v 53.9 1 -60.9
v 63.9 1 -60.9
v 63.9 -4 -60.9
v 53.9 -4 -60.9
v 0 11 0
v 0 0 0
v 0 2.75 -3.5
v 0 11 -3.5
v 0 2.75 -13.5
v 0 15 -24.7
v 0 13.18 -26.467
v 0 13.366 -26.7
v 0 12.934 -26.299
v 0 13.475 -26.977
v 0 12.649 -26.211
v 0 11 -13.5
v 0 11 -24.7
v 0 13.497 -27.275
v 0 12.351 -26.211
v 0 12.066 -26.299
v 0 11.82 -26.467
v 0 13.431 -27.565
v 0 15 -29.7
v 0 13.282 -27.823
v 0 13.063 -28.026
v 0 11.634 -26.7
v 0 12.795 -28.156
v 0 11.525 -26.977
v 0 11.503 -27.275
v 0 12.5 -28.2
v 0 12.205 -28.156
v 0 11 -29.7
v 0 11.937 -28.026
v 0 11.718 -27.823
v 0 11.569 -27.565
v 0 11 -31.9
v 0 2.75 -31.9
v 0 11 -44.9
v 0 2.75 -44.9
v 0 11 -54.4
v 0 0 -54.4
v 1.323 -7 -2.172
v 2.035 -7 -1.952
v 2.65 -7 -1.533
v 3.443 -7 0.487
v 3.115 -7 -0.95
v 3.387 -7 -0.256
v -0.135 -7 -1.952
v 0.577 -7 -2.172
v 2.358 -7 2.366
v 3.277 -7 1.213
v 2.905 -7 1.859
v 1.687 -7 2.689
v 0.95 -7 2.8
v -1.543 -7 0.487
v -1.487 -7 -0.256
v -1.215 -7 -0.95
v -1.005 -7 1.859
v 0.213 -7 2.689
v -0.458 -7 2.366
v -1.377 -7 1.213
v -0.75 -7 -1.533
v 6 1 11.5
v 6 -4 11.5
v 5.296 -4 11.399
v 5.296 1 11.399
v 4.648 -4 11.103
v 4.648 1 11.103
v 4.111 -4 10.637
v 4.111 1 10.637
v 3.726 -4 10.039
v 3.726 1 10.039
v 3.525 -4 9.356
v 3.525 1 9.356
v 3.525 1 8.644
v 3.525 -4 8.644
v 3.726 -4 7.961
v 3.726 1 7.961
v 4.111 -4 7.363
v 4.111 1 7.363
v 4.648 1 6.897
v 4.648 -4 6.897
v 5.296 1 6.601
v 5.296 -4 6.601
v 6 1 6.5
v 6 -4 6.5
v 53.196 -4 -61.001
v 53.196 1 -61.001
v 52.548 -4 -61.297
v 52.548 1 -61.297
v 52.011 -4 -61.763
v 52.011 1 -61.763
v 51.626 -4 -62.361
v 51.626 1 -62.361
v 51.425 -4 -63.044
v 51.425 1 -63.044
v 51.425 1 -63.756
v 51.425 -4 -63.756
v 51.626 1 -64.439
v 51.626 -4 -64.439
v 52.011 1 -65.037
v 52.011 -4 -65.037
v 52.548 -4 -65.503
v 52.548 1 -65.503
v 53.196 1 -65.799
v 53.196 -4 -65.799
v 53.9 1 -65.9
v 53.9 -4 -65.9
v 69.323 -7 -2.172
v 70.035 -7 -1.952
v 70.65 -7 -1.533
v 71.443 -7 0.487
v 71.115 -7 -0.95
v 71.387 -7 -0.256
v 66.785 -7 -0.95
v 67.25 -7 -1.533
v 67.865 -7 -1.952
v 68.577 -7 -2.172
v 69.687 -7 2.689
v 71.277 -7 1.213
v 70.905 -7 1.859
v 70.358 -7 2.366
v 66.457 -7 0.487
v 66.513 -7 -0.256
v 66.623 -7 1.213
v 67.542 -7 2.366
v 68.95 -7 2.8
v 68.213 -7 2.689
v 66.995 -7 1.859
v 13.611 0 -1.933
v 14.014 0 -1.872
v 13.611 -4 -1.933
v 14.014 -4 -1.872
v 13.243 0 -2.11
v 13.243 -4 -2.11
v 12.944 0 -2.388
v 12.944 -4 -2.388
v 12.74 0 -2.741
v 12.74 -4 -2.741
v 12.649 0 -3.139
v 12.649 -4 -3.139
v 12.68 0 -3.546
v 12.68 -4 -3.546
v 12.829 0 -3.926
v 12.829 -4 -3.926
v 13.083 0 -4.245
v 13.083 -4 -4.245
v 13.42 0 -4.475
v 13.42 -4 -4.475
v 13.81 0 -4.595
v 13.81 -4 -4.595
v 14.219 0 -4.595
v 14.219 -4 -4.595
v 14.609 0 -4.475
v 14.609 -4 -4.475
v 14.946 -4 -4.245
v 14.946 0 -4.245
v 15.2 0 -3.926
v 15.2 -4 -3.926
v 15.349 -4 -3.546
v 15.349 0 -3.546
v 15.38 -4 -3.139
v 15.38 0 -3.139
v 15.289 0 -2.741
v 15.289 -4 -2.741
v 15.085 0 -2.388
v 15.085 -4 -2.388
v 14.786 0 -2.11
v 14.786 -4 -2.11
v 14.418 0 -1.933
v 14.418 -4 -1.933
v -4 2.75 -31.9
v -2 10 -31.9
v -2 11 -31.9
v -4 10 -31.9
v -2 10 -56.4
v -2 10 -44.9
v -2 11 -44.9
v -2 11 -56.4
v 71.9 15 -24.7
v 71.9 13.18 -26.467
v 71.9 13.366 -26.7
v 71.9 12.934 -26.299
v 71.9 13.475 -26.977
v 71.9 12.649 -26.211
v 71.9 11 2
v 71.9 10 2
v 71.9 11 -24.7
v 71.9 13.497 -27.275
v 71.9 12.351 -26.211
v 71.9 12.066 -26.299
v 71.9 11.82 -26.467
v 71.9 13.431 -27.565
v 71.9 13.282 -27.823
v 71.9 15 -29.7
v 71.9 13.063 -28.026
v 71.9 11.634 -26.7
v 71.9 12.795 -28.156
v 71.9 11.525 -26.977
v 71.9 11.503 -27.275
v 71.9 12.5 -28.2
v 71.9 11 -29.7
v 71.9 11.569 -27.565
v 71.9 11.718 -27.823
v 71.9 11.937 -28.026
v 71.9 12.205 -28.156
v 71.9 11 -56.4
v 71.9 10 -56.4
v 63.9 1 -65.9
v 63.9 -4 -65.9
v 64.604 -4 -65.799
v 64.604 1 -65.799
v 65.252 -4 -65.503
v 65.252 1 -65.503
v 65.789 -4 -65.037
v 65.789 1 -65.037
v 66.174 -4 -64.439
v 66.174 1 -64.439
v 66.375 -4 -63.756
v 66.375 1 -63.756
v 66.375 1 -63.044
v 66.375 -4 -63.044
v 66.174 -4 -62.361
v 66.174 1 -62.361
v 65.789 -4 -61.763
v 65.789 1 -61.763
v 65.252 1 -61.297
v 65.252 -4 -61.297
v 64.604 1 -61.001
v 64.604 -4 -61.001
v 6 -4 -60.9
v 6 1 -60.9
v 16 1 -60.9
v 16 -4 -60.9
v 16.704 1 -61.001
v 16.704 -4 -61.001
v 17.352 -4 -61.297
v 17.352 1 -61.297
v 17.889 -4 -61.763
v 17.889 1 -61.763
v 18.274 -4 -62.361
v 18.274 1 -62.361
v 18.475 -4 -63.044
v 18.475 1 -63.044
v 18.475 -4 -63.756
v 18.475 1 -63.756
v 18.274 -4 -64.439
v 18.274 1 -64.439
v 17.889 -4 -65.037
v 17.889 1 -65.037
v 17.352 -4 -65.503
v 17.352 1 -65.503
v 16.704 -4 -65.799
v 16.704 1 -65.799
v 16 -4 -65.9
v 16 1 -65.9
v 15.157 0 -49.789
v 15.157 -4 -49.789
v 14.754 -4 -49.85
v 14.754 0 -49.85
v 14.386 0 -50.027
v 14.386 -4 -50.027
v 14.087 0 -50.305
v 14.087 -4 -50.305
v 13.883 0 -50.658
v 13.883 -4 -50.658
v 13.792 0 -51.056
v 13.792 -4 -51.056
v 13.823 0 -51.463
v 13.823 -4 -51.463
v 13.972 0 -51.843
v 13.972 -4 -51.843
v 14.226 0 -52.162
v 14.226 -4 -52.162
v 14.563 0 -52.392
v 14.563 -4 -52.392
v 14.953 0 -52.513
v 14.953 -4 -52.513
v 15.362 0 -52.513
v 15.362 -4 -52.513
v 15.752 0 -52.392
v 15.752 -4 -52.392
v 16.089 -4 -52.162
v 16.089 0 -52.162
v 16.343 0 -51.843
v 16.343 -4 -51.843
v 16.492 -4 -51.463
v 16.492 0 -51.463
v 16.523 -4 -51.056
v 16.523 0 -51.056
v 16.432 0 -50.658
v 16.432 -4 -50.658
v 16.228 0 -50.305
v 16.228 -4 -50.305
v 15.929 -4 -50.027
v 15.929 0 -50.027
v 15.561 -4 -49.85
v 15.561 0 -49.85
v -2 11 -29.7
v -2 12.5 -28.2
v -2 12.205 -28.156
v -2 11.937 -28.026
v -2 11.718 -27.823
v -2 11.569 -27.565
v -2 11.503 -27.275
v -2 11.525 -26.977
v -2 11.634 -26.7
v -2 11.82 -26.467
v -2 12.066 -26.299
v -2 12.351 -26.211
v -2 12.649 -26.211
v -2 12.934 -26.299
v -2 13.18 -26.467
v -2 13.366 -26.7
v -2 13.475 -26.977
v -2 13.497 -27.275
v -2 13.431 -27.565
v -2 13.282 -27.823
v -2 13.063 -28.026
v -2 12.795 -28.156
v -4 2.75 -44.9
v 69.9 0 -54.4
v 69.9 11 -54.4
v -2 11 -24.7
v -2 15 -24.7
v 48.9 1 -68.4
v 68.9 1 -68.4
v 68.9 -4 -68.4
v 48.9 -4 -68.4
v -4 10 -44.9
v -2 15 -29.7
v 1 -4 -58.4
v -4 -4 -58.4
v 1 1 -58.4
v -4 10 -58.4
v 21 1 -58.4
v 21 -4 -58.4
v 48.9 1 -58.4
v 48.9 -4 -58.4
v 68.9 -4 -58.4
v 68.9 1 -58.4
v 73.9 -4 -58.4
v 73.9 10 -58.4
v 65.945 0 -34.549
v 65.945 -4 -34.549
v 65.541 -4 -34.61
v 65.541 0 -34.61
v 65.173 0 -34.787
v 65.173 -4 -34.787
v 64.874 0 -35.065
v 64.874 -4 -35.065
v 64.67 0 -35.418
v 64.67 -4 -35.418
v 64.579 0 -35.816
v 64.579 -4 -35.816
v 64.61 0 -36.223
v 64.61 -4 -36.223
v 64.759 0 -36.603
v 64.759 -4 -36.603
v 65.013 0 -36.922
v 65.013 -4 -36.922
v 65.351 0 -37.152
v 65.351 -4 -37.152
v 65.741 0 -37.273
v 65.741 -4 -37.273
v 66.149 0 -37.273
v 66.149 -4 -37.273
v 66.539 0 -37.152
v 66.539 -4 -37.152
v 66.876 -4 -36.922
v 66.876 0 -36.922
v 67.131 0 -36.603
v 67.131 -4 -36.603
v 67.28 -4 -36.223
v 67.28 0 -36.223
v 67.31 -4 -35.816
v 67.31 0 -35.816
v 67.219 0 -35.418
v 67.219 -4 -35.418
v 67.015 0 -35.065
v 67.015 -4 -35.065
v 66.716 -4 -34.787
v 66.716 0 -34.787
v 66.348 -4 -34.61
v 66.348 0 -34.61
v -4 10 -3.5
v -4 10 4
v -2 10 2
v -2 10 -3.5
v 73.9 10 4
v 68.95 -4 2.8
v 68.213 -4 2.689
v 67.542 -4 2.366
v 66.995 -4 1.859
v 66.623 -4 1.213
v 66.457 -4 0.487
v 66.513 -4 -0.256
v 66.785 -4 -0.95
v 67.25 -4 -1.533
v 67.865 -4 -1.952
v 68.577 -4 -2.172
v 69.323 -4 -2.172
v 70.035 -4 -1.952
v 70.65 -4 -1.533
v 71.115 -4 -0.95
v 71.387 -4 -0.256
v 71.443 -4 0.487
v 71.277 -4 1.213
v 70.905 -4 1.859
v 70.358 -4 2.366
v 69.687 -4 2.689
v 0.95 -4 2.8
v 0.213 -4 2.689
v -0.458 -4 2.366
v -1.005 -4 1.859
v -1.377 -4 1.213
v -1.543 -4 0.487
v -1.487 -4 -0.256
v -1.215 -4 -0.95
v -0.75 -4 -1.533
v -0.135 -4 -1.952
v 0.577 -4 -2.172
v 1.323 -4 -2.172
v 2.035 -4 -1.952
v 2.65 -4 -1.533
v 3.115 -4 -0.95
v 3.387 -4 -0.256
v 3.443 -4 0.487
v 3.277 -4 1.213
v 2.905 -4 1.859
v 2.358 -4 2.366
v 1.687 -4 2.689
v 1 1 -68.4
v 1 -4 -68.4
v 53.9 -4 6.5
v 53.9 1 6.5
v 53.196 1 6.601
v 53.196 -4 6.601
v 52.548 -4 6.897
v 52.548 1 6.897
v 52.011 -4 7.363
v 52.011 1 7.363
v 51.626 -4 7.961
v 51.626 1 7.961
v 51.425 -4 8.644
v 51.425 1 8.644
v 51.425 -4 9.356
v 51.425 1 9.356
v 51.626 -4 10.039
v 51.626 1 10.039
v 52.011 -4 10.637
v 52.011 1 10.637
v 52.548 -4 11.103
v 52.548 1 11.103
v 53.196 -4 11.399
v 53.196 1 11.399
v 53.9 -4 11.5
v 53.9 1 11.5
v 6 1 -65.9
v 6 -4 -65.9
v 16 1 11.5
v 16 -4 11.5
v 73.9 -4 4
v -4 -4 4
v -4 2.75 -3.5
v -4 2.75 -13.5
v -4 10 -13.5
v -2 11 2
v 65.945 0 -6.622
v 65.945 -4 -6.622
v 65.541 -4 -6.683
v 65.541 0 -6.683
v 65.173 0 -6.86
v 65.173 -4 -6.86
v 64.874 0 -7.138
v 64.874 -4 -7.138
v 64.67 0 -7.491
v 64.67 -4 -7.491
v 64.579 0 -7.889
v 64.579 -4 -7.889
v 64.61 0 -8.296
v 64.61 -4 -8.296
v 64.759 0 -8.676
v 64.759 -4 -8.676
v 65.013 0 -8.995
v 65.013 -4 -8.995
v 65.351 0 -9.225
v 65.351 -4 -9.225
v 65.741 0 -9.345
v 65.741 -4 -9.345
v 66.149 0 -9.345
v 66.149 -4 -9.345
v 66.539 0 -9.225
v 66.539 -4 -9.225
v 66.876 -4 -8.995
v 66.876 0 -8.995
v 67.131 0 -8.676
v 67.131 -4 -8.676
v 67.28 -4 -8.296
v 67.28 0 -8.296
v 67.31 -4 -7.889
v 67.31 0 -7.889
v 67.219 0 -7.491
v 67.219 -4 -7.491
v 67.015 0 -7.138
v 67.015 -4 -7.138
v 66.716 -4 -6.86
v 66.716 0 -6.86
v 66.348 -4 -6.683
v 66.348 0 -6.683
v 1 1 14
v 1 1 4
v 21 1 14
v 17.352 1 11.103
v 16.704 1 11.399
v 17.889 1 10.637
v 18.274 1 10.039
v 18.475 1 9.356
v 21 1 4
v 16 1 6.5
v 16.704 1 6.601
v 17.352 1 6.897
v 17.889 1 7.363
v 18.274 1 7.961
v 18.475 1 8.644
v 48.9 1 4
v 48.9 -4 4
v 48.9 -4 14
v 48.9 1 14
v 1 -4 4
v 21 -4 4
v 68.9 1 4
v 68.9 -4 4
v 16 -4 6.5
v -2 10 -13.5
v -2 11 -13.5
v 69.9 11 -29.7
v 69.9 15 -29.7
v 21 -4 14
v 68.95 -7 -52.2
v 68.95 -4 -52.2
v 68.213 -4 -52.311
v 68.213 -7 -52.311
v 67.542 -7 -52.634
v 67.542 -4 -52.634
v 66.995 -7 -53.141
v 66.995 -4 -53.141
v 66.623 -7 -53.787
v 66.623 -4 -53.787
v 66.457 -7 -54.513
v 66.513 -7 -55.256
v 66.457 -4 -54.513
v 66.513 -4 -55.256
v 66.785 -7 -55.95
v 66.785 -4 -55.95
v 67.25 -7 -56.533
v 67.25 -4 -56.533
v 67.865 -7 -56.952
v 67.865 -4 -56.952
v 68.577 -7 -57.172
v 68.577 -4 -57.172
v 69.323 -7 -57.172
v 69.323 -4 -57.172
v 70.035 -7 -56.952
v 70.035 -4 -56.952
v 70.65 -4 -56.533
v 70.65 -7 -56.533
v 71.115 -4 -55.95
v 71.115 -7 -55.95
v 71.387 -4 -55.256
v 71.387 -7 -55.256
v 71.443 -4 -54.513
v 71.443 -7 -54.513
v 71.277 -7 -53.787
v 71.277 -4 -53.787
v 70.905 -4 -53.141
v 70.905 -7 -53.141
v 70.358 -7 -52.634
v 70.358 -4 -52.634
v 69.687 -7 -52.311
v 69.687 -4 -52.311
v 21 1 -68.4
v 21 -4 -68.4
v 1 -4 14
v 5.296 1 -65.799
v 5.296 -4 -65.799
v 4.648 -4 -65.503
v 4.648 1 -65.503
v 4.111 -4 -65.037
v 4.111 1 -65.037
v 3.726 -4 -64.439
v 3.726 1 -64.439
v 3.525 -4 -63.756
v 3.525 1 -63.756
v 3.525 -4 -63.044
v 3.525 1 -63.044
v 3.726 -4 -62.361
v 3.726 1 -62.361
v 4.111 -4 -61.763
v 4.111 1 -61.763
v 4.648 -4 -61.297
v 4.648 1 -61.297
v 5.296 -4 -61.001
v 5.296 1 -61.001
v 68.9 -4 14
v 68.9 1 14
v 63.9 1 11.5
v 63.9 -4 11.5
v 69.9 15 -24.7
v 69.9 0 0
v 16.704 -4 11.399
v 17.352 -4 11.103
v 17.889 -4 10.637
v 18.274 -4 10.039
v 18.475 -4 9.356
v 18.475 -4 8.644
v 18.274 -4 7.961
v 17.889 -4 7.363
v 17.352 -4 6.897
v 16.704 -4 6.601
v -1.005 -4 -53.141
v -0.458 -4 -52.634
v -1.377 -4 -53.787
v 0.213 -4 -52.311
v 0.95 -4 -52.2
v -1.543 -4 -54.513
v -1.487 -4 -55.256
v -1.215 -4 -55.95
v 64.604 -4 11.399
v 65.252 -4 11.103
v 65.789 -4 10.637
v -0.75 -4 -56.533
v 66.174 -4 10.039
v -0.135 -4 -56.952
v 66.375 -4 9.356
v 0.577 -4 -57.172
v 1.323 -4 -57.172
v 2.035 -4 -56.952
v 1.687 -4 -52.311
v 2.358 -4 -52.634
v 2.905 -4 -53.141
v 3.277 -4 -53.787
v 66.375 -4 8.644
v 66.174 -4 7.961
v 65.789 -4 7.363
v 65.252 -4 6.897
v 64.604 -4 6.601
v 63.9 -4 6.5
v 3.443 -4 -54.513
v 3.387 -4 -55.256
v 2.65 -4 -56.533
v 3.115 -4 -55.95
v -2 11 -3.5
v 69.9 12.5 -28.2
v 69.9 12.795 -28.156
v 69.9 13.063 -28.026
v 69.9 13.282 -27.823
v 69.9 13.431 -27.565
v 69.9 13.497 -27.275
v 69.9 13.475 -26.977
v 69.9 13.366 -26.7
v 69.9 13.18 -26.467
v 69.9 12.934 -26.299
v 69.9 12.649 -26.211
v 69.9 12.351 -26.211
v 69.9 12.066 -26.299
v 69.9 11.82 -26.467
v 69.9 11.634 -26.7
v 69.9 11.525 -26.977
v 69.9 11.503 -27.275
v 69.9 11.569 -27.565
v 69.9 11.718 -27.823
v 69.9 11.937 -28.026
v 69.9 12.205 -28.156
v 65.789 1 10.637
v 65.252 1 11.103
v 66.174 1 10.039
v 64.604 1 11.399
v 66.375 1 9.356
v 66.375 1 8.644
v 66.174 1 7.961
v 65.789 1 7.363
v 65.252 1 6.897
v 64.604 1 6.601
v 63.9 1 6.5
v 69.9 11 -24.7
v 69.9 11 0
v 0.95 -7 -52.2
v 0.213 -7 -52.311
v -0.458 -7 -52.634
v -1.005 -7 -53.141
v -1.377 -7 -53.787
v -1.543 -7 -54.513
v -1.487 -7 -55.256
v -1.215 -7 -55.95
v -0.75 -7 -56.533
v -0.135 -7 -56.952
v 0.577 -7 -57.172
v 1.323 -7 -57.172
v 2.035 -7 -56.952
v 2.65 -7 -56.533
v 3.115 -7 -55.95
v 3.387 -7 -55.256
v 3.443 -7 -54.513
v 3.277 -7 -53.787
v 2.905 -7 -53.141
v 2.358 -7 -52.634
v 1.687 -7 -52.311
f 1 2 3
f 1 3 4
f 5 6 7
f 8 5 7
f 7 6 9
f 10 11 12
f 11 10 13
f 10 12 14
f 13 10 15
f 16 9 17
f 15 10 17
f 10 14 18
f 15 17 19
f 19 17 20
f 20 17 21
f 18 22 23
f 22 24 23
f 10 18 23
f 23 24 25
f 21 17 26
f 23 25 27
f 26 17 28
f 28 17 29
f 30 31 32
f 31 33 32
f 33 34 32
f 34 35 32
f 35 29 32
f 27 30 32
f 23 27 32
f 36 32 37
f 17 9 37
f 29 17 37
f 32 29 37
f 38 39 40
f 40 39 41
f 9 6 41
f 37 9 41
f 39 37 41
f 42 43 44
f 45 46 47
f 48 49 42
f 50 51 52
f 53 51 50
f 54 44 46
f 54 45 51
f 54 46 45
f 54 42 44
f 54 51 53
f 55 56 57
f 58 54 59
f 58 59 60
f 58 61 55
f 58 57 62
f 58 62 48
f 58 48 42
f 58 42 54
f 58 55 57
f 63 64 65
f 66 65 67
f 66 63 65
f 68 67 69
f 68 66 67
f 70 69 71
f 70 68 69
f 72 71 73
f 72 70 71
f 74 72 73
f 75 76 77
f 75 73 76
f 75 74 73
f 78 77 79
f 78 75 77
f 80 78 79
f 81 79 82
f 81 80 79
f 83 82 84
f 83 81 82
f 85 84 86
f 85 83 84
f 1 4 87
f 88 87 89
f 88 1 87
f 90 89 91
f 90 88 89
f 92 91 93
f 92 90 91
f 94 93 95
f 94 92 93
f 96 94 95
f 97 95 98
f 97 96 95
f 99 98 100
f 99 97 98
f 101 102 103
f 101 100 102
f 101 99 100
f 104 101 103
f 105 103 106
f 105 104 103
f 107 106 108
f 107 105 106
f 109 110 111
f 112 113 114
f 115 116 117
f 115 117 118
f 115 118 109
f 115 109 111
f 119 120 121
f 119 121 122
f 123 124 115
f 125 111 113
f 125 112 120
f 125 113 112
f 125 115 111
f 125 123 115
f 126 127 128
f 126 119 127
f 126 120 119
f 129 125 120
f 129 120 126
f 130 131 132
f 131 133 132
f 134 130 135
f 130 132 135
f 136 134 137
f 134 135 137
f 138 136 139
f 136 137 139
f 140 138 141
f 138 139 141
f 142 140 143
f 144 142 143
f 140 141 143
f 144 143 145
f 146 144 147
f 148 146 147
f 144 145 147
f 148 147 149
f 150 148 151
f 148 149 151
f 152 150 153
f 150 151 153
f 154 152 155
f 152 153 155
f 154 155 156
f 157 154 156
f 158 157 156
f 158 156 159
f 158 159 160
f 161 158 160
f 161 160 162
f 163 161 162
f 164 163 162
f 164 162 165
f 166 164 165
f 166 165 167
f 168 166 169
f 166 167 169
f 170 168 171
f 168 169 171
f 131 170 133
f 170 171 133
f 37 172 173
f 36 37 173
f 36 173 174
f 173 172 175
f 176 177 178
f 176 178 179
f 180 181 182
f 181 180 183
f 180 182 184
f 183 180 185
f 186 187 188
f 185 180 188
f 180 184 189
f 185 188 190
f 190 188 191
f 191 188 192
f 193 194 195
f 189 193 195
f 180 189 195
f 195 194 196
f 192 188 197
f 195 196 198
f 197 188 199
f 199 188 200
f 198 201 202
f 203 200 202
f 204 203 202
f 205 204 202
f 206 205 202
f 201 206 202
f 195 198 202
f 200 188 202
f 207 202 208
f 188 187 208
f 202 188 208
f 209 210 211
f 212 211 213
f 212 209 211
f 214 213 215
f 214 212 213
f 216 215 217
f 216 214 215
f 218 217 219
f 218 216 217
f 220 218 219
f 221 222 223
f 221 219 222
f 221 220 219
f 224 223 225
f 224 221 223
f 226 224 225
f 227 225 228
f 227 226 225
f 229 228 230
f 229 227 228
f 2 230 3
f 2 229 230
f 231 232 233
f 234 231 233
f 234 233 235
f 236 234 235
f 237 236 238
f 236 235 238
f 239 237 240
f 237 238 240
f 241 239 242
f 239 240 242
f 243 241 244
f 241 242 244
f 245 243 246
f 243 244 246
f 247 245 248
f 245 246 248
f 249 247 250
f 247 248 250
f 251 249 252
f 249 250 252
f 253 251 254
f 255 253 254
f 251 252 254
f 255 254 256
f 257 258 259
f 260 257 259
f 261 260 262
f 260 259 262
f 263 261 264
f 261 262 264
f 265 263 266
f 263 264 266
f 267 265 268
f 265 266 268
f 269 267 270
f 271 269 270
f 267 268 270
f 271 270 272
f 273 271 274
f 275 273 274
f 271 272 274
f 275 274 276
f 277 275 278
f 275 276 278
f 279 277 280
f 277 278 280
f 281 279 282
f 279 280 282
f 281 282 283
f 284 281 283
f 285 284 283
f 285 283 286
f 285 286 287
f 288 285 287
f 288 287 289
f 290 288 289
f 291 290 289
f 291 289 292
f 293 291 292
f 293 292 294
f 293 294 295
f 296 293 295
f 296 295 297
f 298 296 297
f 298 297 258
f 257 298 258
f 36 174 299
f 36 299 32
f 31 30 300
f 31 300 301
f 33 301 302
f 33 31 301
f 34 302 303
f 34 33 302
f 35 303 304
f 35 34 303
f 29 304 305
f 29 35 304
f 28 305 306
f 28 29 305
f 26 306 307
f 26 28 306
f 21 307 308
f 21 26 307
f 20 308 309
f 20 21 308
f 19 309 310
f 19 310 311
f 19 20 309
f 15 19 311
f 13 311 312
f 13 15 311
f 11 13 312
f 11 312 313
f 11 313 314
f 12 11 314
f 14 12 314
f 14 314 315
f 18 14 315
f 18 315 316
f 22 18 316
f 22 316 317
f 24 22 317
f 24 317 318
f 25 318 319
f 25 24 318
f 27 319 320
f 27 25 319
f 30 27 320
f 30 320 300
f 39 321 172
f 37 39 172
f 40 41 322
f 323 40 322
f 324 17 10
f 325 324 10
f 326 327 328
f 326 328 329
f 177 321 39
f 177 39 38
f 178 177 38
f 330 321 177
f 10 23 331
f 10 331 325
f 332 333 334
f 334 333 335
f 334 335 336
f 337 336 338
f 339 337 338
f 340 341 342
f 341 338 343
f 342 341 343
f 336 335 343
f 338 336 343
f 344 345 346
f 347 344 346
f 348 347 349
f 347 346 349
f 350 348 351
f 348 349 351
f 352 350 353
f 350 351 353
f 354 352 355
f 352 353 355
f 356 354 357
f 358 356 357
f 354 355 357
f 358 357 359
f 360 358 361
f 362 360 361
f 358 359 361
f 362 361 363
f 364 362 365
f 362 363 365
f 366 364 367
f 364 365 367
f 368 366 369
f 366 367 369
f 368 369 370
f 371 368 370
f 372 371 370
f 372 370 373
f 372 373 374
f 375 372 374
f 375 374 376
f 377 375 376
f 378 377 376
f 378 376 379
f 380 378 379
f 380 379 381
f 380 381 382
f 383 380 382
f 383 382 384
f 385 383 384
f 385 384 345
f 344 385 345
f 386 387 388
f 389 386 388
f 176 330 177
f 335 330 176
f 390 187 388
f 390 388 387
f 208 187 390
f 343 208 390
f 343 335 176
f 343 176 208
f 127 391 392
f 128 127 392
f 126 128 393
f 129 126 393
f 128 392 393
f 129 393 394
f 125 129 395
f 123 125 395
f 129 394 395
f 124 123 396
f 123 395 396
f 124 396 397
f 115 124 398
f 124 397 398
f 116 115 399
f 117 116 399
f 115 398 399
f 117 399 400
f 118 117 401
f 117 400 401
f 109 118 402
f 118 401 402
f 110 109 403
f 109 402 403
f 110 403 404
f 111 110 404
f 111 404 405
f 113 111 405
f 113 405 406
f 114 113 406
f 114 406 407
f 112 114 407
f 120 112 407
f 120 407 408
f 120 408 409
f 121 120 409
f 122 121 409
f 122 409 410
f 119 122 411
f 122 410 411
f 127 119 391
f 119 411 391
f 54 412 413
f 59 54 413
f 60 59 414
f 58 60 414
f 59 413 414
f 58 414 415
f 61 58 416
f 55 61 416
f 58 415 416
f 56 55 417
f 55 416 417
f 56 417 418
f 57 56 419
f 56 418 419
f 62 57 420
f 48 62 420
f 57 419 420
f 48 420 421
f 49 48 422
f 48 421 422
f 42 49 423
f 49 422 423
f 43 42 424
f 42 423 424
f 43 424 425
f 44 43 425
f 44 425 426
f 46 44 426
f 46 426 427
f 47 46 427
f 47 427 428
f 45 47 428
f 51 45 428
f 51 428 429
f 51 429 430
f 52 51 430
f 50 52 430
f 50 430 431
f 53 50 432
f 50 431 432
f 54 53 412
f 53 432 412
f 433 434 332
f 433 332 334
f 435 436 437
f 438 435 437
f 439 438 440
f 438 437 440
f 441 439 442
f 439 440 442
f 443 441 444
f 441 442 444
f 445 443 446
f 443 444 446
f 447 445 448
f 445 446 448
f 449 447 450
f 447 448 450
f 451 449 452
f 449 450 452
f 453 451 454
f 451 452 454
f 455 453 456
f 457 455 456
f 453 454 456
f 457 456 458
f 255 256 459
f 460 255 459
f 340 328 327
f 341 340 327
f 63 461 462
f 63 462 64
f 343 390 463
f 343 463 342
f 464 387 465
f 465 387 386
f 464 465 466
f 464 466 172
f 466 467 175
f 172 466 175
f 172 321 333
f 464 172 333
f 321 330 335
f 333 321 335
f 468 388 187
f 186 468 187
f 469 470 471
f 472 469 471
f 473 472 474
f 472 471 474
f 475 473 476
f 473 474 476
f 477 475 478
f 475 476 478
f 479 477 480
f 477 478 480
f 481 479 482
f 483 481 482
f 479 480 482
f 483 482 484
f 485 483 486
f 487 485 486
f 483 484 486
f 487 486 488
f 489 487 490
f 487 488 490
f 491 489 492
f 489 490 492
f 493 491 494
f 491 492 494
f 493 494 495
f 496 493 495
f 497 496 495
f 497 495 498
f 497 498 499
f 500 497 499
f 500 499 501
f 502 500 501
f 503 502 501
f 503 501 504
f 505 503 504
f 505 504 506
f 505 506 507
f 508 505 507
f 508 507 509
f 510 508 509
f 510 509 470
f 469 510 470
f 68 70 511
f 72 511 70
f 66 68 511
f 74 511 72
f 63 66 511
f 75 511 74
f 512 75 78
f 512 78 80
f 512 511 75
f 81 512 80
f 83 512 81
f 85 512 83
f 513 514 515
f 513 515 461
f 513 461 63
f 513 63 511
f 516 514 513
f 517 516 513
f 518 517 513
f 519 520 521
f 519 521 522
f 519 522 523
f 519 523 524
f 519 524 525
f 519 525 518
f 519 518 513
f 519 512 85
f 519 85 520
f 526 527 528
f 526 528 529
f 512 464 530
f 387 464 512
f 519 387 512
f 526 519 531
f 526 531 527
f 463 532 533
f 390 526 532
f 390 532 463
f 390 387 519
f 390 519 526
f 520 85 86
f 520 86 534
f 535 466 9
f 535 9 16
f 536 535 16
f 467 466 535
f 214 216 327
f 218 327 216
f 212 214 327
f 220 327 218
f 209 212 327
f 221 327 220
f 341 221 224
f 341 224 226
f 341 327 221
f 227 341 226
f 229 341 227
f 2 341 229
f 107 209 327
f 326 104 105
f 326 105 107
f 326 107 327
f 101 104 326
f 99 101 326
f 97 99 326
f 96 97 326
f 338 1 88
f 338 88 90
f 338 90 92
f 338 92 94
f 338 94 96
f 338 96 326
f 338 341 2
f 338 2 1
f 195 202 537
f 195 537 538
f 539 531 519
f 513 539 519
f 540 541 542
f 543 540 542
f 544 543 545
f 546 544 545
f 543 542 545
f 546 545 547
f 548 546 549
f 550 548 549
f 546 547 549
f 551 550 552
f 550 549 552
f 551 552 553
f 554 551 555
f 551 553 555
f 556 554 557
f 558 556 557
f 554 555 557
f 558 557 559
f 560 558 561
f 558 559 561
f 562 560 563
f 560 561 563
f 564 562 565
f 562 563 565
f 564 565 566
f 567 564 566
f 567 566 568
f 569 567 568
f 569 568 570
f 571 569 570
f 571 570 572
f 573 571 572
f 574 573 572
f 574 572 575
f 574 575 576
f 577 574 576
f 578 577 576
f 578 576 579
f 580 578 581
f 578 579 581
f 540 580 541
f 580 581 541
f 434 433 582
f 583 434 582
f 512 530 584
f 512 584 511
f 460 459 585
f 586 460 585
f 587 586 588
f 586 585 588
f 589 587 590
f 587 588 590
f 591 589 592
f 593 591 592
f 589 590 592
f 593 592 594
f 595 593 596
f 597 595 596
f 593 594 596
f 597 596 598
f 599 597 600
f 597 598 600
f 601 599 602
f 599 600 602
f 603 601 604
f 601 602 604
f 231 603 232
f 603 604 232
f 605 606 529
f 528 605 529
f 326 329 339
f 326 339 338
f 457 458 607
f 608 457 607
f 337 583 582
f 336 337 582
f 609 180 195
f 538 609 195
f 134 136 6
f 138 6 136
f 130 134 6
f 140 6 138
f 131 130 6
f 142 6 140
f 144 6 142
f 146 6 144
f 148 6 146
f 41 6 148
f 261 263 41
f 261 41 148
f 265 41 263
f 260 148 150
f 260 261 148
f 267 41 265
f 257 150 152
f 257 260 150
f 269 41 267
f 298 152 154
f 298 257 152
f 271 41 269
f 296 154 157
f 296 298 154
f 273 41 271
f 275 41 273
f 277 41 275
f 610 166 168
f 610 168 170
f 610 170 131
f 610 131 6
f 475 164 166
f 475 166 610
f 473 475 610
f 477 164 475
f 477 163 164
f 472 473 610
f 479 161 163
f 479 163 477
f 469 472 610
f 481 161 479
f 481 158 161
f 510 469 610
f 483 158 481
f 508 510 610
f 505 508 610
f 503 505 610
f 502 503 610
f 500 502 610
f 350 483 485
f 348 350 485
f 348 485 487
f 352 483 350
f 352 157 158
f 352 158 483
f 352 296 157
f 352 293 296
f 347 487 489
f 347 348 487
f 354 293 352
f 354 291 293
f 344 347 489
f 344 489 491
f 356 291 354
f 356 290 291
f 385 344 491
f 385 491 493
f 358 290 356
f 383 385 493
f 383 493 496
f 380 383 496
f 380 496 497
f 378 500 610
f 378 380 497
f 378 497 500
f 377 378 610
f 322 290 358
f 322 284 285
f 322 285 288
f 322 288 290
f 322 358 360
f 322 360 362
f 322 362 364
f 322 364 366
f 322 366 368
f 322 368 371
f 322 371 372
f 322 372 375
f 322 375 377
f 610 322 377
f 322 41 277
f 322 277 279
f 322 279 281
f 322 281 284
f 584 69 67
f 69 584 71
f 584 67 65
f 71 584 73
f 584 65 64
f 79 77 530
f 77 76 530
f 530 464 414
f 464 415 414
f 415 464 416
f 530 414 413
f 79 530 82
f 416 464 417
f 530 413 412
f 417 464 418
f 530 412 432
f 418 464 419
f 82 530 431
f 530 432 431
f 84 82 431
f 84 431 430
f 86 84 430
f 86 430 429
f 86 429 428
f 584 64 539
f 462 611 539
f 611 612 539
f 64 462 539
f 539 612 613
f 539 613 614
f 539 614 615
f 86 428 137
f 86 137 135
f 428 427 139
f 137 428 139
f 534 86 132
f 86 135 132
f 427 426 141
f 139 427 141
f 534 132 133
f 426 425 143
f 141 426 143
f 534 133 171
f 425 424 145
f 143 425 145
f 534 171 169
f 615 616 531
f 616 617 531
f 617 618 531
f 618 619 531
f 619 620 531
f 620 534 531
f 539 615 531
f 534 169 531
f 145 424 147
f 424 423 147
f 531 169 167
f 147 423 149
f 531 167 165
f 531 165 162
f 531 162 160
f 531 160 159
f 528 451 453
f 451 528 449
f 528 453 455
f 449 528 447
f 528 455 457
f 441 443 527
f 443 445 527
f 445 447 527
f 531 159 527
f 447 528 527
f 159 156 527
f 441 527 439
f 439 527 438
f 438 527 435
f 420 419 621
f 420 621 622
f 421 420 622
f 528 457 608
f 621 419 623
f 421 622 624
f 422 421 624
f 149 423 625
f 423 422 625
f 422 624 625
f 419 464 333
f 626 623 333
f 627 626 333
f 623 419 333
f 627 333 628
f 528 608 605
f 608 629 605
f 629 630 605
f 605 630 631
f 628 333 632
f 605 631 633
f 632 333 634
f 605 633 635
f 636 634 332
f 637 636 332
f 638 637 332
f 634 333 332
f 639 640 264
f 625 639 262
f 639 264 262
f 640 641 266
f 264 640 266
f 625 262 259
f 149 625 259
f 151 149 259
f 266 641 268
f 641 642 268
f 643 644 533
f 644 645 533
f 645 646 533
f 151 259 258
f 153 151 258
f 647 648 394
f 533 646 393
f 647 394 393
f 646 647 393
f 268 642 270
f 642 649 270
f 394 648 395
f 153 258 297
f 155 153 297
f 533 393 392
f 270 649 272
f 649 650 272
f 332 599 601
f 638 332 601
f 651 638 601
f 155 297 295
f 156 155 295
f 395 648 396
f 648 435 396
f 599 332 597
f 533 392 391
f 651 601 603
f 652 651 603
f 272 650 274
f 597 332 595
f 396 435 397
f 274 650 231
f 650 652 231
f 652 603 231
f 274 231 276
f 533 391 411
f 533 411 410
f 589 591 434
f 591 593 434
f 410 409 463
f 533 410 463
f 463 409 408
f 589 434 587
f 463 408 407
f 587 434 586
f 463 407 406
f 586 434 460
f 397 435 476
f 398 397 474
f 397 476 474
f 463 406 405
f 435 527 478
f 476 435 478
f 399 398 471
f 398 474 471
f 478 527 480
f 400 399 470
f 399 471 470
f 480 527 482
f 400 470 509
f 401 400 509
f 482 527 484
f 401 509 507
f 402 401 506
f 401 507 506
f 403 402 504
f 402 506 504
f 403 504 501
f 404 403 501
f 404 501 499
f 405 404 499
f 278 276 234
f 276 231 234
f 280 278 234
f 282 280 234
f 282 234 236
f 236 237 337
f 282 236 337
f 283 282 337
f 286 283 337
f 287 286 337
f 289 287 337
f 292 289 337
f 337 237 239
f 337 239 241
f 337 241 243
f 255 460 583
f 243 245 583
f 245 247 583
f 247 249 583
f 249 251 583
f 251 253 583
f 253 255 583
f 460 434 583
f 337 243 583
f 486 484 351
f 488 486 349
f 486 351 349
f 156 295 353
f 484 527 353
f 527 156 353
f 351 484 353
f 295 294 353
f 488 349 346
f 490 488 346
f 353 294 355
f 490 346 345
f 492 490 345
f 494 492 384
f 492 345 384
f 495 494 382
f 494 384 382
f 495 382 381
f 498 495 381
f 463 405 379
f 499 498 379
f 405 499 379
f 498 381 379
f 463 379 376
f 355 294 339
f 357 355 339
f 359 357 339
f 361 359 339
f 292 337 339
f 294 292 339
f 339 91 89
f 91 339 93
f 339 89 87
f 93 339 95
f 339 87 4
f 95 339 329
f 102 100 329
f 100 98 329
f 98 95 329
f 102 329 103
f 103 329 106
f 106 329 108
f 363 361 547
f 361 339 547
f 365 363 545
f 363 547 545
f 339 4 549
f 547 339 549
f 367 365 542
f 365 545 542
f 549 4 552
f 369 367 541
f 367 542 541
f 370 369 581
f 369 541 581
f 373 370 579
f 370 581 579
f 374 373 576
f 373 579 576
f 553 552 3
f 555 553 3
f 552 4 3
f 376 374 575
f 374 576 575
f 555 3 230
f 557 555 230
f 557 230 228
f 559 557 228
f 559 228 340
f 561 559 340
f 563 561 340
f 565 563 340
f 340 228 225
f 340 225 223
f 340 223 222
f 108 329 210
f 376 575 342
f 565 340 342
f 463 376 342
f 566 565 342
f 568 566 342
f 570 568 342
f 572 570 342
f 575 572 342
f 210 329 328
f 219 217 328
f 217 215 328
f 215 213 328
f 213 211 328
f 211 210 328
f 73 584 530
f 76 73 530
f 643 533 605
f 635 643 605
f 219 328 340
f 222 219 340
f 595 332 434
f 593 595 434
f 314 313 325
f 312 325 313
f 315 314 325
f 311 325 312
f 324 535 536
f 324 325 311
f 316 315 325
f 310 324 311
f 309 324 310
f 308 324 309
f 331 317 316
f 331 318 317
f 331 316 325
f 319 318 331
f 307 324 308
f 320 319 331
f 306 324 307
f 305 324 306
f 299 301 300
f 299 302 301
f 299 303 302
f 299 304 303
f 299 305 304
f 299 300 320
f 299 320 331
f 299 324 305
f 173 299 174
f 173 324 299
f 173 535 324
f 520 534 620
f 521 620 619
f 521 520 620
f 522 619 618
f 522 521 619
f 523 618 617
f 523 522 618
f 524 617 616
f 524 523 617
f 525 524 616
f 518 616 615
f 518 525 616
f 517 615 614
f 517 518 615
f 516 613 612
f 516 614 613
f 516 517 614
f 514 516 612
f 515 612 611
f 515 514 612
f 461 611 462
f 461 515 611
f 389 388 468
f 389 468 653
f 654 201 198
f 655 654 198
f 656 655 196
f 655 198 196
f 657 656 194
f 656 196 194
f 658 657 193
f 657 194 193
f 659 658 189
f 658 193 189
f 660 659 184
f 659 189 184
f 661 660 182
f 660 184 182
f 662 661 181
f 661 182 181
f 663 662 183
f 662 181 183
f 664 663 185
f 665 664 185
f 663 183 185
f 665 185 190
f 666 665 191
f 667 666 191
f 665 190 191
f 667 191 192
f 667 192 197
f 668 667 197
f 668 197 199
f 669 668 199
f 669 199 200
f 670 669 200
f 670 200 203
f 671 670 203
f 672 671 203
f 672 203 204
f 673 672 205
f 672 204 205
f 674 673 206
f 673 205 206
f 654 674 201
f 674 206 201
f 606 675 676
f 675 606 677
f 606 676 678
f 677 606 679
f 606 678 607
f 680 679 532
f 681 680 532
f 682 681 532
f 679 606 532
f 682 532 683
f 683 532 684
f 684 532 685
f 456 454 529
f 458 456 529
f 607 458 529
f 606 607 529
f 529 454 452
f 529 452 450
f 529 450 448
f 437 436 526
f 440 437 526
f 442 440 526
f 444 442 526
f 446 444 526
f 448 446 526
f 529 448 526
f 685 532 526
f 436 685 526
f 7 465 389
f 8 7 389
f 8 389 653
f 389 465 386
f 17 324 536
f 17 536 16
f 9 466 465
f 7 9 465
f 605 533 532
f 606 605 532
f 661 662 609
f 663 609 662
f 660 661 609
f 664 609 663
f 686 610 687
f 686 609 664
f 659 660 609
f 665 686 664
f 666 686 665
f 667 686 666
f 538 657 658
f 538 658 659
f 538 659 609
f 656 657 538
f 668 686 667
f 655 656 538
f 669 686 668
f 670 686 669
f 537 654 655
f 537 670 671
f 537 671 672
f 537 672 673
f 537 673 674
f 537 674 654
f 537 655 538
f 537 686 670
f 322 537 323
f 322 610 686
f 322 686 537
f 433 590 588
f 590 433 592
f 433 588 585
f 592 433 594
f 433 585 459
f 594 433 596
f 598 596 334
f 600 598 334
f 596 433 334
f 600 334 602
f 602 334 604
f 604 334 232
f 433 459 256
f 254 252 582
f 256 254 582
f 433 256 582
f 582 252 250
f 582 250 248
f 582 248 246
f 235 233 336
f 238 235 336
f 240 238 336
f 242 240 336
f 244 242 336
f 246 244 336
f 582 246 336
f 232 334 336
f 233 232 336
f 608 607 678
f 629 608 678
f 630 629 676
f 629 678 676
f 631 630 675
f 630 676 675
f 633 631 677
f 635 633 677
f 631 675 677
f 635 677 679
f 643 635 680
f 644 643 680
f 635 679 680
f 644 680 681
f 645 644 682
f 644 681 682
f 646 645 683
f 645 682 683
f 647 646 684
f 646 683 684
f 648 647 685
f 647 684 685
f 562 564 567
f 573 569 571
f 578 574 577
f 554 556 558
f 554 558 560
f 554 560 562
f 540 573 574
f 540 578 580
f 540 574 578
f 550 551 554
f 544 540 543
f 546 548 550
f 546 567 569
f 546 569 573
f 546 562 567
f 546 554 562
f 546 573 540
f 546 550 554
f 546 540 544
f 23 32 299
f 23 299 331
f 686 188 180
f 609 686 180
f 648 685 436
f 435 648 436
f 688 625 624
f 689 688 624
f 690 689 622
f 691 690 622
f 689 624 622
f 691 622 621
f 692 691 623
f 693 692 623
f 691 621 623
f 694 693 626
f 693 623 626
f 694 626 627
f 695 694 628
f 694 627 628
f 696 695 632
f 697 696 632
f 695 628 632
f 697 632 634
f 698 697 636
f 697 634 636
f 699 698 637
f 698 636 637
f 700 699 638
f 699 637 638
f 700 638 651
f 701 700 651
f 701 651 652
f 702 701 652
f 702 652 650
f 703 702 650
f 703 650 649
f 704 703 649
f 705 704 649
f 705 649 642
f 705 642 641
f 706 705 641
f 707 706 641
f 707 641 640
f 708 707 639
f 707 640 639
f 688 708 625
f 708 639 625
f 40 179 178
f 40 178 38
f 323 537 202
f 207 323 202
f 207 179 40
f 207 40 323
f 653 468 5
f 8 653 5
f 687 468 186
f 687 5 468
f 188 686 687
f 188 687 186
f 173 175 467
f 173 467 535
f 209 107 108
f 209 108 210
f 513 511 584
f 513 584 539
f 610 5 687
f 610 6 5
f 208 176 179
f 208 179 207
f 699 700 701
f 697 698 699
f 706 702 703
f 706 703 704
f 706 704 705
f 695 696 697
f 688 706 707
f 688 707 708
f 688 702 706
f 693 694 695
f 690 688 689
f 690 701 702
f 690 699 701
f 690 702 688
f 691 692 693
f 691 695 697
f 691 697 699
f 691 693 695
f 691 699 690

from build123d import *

# Parameters (mm, degrees)
SKETCH1_W               = 77.9
SKETCH1_H               = 62.4
SKETCH1_W_2             = 69.9
SKETCH1_H_2             = 54.4
BOSS_EXTRUDE1_DEPTH     = 10
SKETCH2_W               = 77.9
SKETCH2_H               = 62.4
BOSS_EXTRUDE2_DEPTH     = 4
SKETCH7_W               = 73.9
SKETCH7_H               = 58.4
SKETCH7_W_2             = 69.9
SKETCH7_H_2             = 54.4
BOSS_EXTRUDE4_DEPTH     = 1
CUT_EXTRUDE1_REACH      = 99.979
SKETCH3_W               = 13
SKETCH3_H               = 7.25
CUT_EXTRUDE2_REACH      = 99.979
SKETCH4_W               = 10
SKETCH4_H               = 7.25
SKETCH5_R               = 1.36925
CUT_EXTRUDE4_DEPTH      = 25
SKETCH6_R               = 2.5
BOSS_EXTRUDE3_DEPTH     = 3
SKETCH9_W               = 10
SKETCH9_H               = 1
SKETCH9_W_2             = 13
CUT_EXTRUDE5_DEPTH      = 11
SKETCH11_W              = 5
SKETCH11_H              = 5
SKETCH11_R              = 1
BOSS_EXTRUDE5_DEPTH     = 2
BOSS_EXTRUDE6_START     = -2
SKETCH12_W              = 5
SKETCH12_H              = 5
SKETCH12_R              = 1
BOSS_EXTRUDE6_DEPTH     = 2
SKETCH13_W              = 20
SKETCH13_H              = 5
BOSS_EXTRUDE7_DEPTH     = 10
CUT_EXTRUDE6_DEPTH      = 10
MIRROR2_COPY_1_SKETCH_W = 20
MIRROR2_COPY_1_SKETCH_H = 5
MIRROR2_COPY_1_DEPTH    = 10
MIRROR2_COPY_2_DEPTH    = 10


with BuildPart() as part:
    # Sketch1 → Boss-Extrude1 (new body)
    with BuildSketch(Plane(origin=(0, 0, 0), x_dir=(1, 0, 0), z_dir=(0, 1, 0))):
        with Locations((34.95, 27.2)):
            Rectangle(SKETCH1_W, SKETCH1_H)
        with Locations((34.95, 27.2)):
            Rectangle(SKETCH1_W_2, SKETCH1_H_2, mode=Mode.SUBTRACT)
    extrude(amount=BOSS_EXTRUDE1_DEPTH)

    # Sketch2 → Boss-Extrude2 (add)
    with BuildSketch(Plane(origin=(0, 0, 0), x_dir=(1, 0, 0), z_dir=(0, 1, 0))):
        with Locations((34.95, 27.2)):
            Rectangle(SKETCH2_W, SKETCH2_H)
    extrude(amount=-BOSS_EXTRUDE2_DEPTH)

    # Sketch7 → Boss-Extrude4 (add)
    with BuildSketch(Plane(origin=(0, 10, 0), x_dir=(1, 0, 0), z_dir=(0, 1, 0))):
        with Locations((34.95, 27.2)):
            Rectangle(SKETCH7_W, SKETCH7_H)
        with Locations((34.95, 27.2)):
            Rectangle(SKETCH7_W_2, SKETCH7_H_2, mode=Mode.SUBTRACT)
    extrude(amount=BOSS_EXTRUDE4_DEPTH)

    # Sketch3 → Cut-Extrude1 (cut, up to next)
    with BuildSketch(Plane.ZY.offset(4), mode=Mode.PRIVATE) as cut_extrude1_sk1:
        with Locations((-38.4, 6.375)):
            Rectangle(SKETCH3_W, SKETCH3_H)
    cut_extrude1_tool1 = extrude(cut_extrude1_sk1.sketch, amount=-CUT_EXTRUDE1_REACH, mode=Mode.PRIVATE) & part.part
    add(cut_extrude1_tool1.solids().sort_by_distance((-4, 6.375, -38.4))[0], mode=Mode.SUBTRACT)

    # Sketch4 → Cut-Extrude2 (cut, up to next)
    with BuildSketch(Plane.ZY.offset(4), mode=Mode.PRIVATE) as cut_extrude2_sk1:
        with Locations((-8.5, 6.375)):
            Rectangle(SKETCH4_W, SKETCH4_H)
    cut_extrude2_tool1 = extrude(cut_extrude2_sk1.sketch, amount=-CUT_EXTRUDE2_REACH, mode=Mode.PRIVATE) & part.part
    add(cut_extrude2_tool1.solids().sort_by_distance((-4, 6.375, -8.5))[0], mode=Mode.SUBTRACT)

    # Sketch5 → Cut-Extrude4 (cut, symmetric)
    with BuildSketch(Plane(origin=(0, -4, 0), x_dir=(-1, 0, 0), z_dir=(0, -1, 0))):
        with Locations(Location((-65.94475, 7.99125, 0), (0, 0, 270))):
            Circle(SKETCH5_R)
        with Locations(Location((-15.15745, 51.15855, 0), (0, 0, 270))):
            Circle(SKETCH5_R)
        with Locations(Location((-65.94475, 35.91855, 0), (0, 0, 270))):
            Circle(SKETCH5_R)
        with Locations(Location((-14.01445, 3.24145, 0), (0, 0, 270))):
            Circle(SKETCH5_R)
    extrude(amount=CUT_EXTRUDE4_DEPTH, both=True, mode=Mode.SUBTRACT)

    # Sketch6 → Boss-Extrude3 (add)
    with BuildSketch(Plane(origin=(0, -4, 0), x_dir=(-1, 0, 0), z_dir=(0, -1, 0))):
        with Locations(Location((-0.95, -0.3, 0), (0, 0, 270))):
            Circle(SKETCH6_R)
        with Locations(Location((-0.95, 54.7, 0), (0, 0, 270))):
            Circle(SKETCH6_R)
        with Locations(Location((-68.95, 54.7, 0), (0, 0, 270))):
            Circle(SKETCH6_R)
        with Locations(Location((-68.95, -0.3, 0), (0, 0, 270))):
            Circle(SKETCH6_R)
    extrude(amount=BOSS_EXTRUDE3_DEPTH)

    # Sketch9 → Cut-Extrude5 (cut)
    with BuildSketch(Plane.ZY.offset(2)):
        with Locations((-8.5, 10.5)):
            Rectangle(SKETCH9_W, SKETCH9_H)
        with Locations((-38.4, 10.5)):
            Rectangle(SKETCH9_W_2, SKETCH9_H)
    extrude(amount=-CUT_EXTRUDE5_DEPTH, mode=Mode.SUBTRACT)

    # Sketch11 → Boss-Extrude5 (add)
    with BuildSketch(Plane(origin=(71.9, 0, 0), x_dir=(0, 0, -1), z_dir=(1, 0, 0))):
        with Locations((27.2, 12.5)):
            Rectangle(SKETCH11_W, SKETCH11_H)
        with Locations((27.2, 12.5)):
            Circle(SKETCH11_R, mode=Mode.SUBTRACT)
    extrude(amount=-BOSS_EXTRUDE5_DEPTH)

    # Sketch12 → Boss-Extrude6 (add)
    with BuildSketch(Plane.ZY.offset(2).offset(BOSS_EXTRUDE6_START)):
        with Locations((-27.2, 12.5)):
            Rectangle(SKETCH12_W, SKETCH12_H)
        with Locations(Location((-27.2, 12.5, 0), (0, 0, 180))):
            Circle(SKETCH12_R, mode=Mode.SUBTRACT)
    extrude(amount=BOSS_EXTRUDE6_DEPTH)

    # Sketch13 → Boss-Extrude7 (add)
    with BuildSketch(Plane(origin=(0, 0, -58.4), x_dir=(-1, 0, 0), z_dir=(0, 0, -1))):
        with Locations((-58.9, -1.5)):
            Rectangle(SKETCH13_W, SKETCH13_H)
    boss_extrude7 = extrude(amount=BOSS_EXTRUDE7_DEPTH)

    # Sketch14 → Cut-Extrude6 (cut)
    with BuildSketch(Plane(origin=(0, 1, 0), x_dir=(1, 0, 0), z_dir=(0, 1, 0))):
        with BuildLine():
            Line((63.9, 60.9), (53.9, 60.9))
            ThreePointArc((53.9, 60.9), (51.4, 63.4), (53.9, 65.9))
            Line((53.9, 65.9), (63.9, 65.9))
            ThreePointArc((63.9, 65.9), (66.4, 63.4), (63.9, 60.9))
        make_face()
    cut_extrude6 = extrude(amount=-CUT_EXTRUDE6_DEPTH, mode=Mode.SUBTRACT)

    # Mirror1: Boss-Extrude7, Cut-Extrude6 across plane
    add(boss_extrude7.mirror(Plane(origin=(0, 0, -27.2), x_dir=(1, 0, 0), z_dir=(0, 0, -1))))
    add(cut_extrude6.mirror(Plane(origin=(0, 0, -27.2), x_dir=(1, 0, 0), z_dir=(0, 0, -1))), mode=Mode.SUBTRACT)

    # Mirror2: Boss-Extrude7, Cut-Extrude6 across plane
    add(boss_extrude7.mirror(Plane.ZY.offset(-34.95)))
    add(cut_extrude6.mirror(Plane.ZY.offset(-34.95)), mode=Mode.SUBTRACT)

    # Mirror2 copy 1 sketch → Mirror2 copy 1 (add)
    with BuildSketch(Plane(origin=(69.9, 0, 4), x_dir=(1, 0, 0), z_dir=(0, 0, 1))):
        with Locations((-58.9, -1.5)):
            Rectangle(MIRROR2_COPY_1_SKETCH_W, MIRROR2_COPY_1_SKETCH_H)
    extrude(amount=MIRROR2_COPY_1_DEPTH)

    # Mirror2 copy 2 sketch → Mirror2 copy 2 (cut)
    with BuildSketch(Plane(origin=(69.9, 1, -54.4), x_dir=(-1, 0, 0), z_dir=(0, 1, 0))):
        with BuildLine():
            Line((63.9, 60.9), (53.9, 60.9))
            ThreePointArc((53.9, 60.9), (51.4, 63.4), (53.9, 65.9))
            Line((53.9, 65.9), (63.9, 65.9))
            ThreePointArc((63.9, 65.9), (66.4, 63.4), (63.9, 60.9))
        make_face()
    extrude(amount=-MIRROR2_COPY_2_DEPTH, mode=Mode.SUBTRACT)


solid = part.part
